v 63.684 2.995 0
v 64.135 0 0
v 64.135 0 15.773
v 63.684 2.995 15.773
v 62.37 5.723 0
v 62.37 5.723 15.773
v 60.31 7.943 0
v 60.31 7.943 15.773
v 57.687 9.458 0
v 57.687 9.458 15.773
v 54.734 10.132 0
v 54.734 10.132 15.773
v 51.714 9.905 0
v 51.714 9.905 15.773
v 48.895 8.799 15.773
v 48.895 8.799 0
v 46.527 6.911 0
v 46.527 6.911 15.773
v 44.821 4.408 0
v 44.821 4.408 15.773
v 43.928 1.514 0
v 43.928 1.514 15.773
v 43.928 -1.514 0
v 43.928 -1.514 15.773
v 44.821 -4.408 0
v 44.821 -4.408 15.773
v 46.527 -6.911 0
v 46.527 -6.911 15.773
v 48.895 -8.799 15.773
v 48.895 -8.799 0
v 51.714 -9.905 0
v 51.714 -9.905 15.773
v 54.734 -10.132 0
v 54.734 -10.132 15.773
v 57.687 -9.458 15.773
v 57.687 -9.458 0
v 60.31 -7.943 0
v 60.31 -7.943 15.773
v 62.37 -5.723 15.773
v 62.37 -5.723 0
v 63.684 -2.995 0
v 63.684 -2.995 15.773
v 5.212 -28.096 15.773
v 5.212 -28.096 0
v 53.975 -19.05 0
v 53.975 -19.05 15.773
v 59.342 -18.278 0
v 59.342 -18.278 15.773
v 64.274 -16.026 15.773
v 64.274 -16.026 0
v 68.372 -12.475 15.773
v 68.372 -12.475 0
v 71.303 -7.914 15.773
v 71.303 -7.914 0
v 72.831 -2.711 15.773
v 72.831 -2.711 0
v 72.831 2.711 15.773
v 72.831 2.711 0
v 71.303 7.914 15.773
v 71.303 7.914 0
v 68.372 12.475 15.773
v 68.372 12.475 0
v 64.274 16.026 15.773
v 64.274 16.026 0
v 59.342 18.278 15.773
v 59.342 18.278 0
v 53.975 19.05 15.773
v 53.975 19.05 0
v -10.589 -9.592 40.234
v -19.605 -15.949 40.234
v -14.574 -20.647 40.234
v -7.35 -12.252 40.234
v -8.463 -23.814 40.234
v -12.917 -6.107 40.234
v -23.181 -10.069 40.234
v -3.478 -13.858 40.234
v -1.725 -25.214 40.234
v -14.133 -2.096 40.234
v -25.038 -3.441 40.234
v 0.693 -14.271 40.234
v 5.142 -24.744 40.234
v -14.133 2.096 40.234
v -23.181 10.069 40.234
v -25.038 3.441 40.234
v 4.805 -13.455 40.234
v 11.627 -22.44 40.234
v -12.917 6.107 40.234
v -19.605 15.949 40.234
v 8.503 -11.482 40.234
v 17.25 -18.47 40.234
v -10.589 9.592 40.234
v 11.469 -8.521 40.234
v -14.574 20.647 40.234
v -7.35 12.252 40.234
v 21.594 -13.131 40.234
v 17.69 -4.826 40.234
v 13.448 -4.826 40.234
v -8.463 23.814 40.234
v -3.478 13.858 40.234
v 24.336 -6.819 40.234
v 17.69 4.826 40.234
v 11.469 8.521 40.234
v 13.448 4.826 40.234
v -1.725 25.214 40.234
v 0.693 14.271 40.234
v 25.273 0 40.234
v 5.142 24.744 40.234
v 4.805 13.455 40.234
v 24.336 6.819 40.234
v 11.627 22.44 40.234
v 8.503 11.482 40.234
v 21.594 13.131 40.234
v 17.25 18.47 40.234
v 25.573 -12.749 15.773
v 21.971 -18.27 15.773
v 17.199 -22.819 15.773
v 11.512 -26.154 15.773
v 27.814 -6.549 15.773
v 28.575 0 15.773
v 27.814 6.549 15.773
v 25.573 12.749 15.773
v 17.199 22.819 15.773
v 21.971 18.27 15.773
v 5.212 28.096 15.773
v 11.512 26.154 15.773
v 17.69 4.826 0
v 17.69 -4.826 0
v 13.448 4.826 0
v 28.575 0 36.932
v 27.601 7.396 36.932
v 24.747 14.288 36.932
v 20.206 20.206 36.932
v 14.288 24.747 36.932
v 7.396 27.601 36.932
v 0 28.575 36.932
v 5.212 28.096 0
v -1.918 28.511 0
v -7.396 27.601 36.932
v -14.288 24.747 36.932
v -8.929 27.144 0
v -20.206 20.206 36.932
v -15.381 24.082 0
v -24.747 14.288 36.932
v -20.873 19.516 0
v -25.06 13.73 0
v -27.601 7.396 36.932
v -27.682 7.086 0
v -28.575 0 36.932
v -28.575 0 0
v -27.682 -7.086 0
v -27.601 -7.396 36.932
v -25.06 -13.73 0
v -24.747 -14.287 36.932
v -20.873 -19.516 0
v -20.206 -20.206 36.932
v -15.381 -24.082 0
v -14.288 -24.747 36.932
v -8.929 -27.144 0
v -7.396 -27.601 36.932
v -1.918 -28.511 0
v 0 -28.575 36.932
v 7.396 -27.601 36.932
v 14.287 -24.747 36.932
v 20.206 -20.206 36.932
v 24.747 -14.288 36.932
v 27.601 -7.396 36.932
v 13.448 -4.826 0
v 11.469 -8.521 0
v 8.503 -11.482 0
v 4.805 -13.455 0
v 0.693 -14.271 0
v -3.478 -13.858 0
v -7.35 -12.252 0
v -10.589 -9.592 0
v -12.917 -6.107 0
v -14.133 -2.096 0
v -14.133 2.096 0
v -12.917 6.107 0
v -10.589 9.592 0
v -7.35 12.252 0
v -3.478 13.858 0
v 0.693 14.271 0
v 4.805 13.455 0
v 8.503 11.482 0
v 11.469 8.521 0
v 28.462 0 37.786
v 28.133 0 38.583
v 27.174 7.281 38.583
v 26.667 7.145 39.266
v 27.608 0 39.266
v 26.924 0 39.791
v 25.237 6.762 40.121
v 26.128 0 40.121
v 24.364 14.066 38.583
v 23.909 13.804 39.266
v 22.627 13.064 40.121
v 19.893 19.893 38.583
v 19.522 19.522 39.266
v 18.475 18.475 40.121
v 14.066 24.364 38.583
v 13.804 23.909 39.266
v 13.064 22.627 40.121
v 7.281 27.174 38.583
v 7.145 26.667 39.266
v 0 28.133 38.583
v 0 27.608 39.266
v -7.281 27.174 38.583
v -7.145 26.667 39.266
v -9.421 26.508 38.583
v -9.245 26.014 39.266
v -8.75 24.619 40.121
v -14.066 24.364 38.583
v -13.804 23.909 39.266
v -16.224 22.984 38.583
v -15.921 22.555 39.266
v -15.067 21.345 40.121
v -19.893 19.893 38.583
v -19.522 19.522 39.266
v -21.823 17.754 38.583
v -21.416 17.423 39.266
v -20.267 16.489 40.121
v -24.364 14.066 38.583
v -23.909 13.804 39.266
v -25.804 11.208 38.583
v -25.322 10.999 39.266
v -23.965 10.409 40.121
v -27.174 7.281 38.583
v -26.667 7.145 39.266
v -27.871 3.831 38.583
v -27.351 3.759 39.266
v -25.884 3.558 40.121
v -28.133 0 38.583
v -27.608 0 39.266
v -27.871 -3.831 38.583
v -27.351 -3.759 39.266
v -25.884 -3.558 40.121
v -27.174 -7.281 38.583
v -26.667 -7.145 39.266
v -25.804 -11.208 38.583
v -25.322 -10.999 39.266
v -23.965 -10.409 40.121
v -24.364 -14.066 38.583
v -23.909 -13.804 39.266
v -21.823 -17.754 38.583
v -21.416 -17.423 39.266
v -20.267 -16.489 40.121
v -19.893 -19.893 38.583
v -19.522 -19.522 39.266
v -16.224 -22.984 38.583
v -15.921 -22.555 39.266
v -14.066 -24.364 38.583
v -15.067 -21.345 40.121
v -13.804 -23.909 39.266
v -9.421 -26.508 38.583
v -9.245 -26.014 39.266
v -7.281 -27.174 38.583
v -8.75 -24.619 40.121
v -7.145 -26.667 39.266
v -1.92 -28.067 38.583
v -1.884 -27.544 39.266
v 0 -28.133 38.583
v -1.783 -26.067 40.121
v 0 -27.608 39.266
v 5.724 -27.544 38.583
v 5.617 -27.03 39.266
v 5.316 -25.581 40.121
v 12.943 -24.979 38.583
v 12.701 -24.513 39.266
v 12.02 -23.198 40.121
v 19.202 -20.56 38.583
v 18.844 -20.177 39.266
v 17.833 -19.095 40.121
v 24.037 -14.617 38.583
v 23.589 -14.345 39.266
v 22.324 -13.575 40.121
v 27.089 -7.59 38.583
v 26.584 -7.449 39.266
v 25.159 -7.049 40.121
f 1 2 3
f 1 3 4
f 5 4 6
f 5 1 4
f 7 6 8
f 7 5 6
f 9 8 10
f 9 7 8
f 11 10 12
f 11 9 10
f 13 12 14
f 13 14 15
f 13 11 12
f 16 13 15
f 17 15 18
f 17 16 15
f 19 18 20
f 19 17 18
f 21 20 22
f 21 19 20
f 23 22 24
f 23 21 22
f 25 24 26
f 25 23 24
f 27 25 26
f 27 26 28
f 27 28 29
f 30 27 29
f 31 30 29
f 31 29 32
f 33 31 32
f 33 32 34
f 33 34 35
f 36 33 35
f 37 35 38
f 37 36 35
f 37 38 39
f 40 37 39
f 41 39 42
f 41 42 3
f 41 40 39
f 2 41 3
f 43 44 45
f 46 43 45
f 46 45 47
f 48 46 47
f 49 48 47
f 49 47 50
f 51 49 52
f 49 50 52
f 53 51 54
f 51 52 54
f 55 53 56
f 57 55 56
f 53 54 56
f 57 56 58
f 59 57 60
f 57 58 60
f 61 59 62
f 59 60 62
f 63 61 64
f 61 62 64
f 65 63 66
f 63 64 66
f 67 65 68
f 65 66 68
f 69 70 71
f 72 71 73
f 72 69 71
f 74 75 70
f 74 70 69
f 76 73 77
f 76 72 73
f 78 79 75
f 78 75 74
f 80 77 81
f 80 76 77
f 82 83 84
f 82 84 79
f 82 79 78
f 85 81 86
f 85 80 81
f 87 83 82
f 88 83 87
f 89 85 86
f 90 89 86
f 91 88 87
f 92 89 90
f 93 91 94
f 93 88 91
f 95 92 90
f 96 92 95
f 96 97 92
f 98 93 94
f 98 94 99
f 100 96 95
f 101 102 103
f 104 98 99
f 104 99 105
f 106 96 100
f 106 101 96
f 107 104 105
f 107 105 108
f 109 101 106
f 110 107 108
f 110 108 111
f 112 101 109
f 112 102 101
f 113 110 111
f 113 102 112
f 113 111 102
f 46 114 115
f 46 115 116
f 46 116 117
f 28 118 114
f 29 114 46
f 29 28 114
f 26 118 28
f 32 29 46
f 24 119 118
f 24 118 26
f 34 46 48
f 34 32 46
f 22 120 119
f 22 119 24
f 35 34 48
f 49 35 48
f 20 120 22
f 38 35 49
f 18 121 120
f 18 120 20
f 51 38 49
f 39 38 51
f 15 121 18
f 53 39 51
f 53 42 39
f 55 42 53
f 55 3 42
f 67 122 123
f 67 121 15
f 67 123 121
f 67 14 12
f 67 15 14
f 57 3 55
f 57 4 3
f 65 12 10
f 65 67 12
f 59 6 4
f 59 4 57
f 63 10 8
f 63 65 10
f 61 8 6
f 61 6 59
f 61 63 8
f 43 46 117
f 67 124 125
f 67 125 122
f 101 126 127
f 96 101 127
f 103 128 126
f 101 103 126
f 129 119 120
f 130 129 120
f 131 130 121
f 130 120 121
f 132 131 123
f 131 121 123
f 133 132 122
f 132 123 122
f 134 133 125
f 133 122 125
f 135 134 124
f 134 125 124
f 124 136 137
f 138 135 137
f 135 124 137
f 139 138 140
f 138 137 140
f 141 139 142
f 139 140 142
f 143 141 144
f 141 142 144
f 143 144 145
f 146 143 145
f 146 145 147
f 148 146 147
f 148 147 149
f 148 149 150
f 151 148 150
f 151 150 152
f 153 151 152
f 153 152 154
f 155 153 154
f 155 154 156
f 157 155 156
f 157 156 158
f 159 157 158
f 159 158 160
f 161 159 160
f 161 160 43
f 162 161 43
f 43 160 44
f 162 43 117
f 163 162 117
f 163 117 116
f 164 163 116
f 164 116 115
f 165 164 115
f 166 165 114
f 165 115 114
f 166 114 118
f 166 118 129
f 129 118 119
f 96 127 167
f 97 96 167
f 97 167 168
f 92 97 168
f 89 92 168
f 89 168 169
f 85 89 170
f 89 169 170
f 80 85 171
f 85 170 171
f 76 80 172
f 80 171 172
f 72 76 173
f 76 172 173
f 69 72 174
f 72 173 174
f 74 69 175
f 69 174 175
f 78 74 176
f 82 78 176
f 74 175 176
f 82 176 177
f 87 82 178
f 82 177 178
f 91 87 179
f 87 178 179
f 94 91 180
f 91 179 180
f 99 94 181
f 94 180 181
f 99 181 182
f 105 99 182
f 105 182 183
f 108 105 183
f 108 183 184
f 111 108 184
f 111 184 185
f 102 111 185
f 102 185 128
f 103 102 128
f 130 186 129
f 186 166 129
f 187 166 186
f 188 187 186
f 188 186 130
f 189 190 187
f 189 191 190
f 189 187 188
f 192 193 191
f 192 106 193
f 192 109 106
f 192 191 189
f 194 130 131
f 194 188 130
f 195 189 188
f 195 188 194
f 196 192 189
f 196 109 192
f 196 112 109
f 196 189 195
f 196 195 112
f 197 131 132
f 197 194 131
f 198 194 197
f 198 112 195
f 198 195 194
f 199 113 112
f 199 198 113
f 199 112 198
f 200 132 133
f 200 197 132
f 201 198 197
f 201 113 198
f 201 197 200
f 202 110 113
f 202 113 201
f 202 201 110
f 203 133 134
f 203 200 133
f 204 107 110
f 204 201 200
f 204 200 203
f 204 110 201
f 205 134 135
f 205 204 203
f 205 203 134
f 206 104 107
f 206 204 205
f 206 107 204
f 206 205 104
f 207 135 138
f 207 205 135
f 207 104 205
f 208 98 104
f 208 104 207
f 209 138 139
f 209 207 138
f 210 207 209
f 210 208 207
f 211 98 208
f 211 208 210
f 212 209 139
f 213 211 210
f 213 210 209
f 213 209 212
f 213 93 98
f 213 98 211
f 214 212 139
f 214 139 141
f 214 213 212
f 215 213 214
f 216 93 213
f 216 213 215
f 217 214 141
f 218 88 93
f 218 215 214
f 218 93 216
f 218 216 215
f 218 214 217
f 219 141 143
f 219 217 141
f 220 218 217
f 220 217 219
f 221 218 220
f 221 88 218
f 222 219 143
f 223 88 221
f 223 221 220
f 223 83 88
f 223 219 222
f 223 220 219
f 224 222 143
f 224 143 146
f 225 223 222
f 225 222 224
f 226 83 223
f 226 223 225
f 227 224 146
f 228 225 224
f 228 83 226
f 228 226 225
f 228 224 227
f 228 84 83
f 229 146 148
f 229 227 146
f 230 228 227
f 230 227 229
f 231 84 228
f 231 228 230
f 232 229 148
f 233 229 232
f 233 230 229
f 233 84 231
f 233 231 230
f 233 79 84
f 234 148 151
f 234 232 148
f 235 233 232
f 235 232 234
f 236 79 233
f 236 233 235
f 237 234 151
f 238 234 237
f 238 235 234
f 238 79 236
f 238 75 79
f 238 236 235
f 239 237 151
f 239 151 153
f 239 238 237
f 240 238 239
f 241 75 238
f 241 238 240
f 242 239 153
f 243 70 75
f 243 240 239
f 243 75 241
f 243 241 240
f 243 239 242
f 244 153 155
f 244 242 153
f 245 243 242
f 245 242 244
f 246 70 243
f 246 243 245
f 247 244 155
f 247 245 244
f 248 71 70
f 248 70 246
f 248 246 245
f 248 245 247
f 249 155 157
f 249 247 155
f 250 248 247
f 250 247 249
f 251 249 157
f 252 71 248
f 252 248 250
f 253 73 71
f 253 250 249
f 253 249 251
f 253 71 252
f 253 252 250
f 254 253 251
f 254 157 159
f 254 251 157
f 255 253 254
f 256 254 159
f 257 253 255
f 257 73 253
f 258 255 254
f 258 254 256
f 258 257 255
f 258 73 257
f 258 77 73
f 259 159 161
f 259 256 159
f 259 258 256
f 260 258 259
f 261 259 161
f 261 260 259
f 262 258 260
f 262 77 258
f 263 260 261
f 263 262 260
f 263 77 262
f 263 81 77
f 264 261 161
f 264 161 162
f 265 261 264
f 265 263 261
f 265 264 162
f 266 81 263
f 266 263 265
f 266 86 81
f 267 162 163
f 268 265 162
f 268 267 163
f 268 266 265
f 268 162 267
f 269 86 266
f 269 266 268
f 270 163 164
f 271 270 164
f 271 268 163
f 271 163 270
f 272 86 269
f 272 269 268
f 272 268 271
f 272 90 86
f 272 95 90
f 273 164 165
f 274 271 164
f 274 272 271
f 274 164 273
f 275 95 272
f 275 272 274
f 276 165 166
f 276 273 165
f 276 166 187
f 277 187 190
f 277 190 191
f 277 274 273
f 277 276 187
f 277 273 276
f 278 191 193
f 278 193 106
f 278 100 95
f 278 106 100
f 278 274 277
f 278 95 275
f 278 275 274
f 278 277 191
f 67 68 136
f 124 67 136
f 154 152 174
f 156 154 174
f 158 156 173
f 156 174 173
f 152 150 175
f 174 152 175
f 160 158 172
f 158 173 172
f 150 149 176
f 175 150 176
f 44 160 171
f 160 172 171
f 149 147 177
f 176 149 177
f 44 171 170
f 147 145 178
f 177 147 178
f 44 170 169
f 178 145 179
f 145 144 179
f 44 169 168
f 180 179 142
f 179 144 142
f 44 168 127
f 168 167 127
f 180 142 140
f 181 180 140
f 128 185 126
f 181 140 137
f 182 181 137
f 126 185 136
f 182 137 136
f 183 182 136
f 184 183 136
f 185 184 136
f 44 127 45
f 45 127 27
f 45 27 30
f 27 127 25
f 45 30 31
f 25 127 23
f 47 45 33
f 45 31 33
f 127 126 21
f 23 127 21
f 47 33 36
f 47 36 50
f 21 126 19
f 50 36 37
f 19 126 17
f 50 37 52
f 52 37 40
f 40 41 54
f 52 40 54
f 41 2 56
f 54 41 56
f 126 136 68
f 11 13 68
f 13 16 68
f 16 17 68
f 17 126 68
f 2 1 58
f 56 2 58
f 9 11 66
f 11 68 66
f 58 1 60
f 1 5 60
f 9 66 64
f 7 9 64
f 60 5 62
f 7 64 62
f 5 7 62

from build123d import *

# Parameters (mm, degrees)
F0_R     = 10.16
F1_DEPTH = 15.7734
F3_DEPTH = 40.2336
F4_R     = 3.302


with BuildPart() as f1:
    # F0 (on Top) → F1 (new body)
    with BuildSketch(Plane.XY):
        with BuildLine():
            ThreePointArc((5.2118165849, 28.0956863751), (21.9710978778, 18.270234893), (28.575, 0))
            ThreePointArc((28.575, 0), (21.9710977085, -18.2702350965), (5.2118160642, -28.0956864716))
            Line((5.2118160642, -28.0956864716), (53.975, -19.05))
            ThreePointArc((53.975, -19.05), (34.925, 0), (53.975, 19.05))
            Line((53.975, 19.05), (5.2118165849, 28.0956863751))
        make_face()
        with BuildLine():
            ThreePointArc((73.025, 0), (67.4453841816, 13.4703841816), (53.975, 19.05))
            ThreePointArc((53.975, 19.05), (34.925, 0), (53.975, -19.05))
            ThreePointArc((53.975, -19.05), (67.4453841816, -13.4703841816), (73.025, 0))
        make_face()
        with Locations((53.975, 0)):
            Circle(F0_R, mode=Mode.SUBTRACT)
    extrude(amount=F1_DEPTH)

    # F2 (on face) → F3 (join)
    with BuildSketch(Plane.XY):
        with BuildLine():
            ThreePointArc((5.2118165849, 28.0956863751), (-28.575, 2.648e-07), (5.2118160642, -28.0956864716))
            ThreePointArc((5.2118160642, -28.0956864716), (21.9710977085, -18.2702350965), (28.575, 0))
            ThreePointArc((28.575, 0), (21.9710978778, 18.270234893), (5.2118165849, 28.0956863751))
        make_face()
        with BuildLine():
            Line((17.6895648793, -4.826), (13.4477648793, -4.826))
            ThreePointArc((13.4477648793, -4.826), (-14.2875, 0), (13.4477648793, 4.826))
            Line((13.4477648793, 4.826), (17.6895648793, 4.826))
            Line((17.6895648793, 4.826), (17.6895648793, -4.826))
        make_face(mode=Mode.SUBTRACT)
    extrude(amount=F3_DEPTH)

    # F4
    f4_edges = [f1.edges().sort_by_distance(p)[0] for p in [
        (-5.211816, 28.095686, 40.2336),
    ]]
    fillet(f4_edges, radius=F4_R)


solid = f1.part
